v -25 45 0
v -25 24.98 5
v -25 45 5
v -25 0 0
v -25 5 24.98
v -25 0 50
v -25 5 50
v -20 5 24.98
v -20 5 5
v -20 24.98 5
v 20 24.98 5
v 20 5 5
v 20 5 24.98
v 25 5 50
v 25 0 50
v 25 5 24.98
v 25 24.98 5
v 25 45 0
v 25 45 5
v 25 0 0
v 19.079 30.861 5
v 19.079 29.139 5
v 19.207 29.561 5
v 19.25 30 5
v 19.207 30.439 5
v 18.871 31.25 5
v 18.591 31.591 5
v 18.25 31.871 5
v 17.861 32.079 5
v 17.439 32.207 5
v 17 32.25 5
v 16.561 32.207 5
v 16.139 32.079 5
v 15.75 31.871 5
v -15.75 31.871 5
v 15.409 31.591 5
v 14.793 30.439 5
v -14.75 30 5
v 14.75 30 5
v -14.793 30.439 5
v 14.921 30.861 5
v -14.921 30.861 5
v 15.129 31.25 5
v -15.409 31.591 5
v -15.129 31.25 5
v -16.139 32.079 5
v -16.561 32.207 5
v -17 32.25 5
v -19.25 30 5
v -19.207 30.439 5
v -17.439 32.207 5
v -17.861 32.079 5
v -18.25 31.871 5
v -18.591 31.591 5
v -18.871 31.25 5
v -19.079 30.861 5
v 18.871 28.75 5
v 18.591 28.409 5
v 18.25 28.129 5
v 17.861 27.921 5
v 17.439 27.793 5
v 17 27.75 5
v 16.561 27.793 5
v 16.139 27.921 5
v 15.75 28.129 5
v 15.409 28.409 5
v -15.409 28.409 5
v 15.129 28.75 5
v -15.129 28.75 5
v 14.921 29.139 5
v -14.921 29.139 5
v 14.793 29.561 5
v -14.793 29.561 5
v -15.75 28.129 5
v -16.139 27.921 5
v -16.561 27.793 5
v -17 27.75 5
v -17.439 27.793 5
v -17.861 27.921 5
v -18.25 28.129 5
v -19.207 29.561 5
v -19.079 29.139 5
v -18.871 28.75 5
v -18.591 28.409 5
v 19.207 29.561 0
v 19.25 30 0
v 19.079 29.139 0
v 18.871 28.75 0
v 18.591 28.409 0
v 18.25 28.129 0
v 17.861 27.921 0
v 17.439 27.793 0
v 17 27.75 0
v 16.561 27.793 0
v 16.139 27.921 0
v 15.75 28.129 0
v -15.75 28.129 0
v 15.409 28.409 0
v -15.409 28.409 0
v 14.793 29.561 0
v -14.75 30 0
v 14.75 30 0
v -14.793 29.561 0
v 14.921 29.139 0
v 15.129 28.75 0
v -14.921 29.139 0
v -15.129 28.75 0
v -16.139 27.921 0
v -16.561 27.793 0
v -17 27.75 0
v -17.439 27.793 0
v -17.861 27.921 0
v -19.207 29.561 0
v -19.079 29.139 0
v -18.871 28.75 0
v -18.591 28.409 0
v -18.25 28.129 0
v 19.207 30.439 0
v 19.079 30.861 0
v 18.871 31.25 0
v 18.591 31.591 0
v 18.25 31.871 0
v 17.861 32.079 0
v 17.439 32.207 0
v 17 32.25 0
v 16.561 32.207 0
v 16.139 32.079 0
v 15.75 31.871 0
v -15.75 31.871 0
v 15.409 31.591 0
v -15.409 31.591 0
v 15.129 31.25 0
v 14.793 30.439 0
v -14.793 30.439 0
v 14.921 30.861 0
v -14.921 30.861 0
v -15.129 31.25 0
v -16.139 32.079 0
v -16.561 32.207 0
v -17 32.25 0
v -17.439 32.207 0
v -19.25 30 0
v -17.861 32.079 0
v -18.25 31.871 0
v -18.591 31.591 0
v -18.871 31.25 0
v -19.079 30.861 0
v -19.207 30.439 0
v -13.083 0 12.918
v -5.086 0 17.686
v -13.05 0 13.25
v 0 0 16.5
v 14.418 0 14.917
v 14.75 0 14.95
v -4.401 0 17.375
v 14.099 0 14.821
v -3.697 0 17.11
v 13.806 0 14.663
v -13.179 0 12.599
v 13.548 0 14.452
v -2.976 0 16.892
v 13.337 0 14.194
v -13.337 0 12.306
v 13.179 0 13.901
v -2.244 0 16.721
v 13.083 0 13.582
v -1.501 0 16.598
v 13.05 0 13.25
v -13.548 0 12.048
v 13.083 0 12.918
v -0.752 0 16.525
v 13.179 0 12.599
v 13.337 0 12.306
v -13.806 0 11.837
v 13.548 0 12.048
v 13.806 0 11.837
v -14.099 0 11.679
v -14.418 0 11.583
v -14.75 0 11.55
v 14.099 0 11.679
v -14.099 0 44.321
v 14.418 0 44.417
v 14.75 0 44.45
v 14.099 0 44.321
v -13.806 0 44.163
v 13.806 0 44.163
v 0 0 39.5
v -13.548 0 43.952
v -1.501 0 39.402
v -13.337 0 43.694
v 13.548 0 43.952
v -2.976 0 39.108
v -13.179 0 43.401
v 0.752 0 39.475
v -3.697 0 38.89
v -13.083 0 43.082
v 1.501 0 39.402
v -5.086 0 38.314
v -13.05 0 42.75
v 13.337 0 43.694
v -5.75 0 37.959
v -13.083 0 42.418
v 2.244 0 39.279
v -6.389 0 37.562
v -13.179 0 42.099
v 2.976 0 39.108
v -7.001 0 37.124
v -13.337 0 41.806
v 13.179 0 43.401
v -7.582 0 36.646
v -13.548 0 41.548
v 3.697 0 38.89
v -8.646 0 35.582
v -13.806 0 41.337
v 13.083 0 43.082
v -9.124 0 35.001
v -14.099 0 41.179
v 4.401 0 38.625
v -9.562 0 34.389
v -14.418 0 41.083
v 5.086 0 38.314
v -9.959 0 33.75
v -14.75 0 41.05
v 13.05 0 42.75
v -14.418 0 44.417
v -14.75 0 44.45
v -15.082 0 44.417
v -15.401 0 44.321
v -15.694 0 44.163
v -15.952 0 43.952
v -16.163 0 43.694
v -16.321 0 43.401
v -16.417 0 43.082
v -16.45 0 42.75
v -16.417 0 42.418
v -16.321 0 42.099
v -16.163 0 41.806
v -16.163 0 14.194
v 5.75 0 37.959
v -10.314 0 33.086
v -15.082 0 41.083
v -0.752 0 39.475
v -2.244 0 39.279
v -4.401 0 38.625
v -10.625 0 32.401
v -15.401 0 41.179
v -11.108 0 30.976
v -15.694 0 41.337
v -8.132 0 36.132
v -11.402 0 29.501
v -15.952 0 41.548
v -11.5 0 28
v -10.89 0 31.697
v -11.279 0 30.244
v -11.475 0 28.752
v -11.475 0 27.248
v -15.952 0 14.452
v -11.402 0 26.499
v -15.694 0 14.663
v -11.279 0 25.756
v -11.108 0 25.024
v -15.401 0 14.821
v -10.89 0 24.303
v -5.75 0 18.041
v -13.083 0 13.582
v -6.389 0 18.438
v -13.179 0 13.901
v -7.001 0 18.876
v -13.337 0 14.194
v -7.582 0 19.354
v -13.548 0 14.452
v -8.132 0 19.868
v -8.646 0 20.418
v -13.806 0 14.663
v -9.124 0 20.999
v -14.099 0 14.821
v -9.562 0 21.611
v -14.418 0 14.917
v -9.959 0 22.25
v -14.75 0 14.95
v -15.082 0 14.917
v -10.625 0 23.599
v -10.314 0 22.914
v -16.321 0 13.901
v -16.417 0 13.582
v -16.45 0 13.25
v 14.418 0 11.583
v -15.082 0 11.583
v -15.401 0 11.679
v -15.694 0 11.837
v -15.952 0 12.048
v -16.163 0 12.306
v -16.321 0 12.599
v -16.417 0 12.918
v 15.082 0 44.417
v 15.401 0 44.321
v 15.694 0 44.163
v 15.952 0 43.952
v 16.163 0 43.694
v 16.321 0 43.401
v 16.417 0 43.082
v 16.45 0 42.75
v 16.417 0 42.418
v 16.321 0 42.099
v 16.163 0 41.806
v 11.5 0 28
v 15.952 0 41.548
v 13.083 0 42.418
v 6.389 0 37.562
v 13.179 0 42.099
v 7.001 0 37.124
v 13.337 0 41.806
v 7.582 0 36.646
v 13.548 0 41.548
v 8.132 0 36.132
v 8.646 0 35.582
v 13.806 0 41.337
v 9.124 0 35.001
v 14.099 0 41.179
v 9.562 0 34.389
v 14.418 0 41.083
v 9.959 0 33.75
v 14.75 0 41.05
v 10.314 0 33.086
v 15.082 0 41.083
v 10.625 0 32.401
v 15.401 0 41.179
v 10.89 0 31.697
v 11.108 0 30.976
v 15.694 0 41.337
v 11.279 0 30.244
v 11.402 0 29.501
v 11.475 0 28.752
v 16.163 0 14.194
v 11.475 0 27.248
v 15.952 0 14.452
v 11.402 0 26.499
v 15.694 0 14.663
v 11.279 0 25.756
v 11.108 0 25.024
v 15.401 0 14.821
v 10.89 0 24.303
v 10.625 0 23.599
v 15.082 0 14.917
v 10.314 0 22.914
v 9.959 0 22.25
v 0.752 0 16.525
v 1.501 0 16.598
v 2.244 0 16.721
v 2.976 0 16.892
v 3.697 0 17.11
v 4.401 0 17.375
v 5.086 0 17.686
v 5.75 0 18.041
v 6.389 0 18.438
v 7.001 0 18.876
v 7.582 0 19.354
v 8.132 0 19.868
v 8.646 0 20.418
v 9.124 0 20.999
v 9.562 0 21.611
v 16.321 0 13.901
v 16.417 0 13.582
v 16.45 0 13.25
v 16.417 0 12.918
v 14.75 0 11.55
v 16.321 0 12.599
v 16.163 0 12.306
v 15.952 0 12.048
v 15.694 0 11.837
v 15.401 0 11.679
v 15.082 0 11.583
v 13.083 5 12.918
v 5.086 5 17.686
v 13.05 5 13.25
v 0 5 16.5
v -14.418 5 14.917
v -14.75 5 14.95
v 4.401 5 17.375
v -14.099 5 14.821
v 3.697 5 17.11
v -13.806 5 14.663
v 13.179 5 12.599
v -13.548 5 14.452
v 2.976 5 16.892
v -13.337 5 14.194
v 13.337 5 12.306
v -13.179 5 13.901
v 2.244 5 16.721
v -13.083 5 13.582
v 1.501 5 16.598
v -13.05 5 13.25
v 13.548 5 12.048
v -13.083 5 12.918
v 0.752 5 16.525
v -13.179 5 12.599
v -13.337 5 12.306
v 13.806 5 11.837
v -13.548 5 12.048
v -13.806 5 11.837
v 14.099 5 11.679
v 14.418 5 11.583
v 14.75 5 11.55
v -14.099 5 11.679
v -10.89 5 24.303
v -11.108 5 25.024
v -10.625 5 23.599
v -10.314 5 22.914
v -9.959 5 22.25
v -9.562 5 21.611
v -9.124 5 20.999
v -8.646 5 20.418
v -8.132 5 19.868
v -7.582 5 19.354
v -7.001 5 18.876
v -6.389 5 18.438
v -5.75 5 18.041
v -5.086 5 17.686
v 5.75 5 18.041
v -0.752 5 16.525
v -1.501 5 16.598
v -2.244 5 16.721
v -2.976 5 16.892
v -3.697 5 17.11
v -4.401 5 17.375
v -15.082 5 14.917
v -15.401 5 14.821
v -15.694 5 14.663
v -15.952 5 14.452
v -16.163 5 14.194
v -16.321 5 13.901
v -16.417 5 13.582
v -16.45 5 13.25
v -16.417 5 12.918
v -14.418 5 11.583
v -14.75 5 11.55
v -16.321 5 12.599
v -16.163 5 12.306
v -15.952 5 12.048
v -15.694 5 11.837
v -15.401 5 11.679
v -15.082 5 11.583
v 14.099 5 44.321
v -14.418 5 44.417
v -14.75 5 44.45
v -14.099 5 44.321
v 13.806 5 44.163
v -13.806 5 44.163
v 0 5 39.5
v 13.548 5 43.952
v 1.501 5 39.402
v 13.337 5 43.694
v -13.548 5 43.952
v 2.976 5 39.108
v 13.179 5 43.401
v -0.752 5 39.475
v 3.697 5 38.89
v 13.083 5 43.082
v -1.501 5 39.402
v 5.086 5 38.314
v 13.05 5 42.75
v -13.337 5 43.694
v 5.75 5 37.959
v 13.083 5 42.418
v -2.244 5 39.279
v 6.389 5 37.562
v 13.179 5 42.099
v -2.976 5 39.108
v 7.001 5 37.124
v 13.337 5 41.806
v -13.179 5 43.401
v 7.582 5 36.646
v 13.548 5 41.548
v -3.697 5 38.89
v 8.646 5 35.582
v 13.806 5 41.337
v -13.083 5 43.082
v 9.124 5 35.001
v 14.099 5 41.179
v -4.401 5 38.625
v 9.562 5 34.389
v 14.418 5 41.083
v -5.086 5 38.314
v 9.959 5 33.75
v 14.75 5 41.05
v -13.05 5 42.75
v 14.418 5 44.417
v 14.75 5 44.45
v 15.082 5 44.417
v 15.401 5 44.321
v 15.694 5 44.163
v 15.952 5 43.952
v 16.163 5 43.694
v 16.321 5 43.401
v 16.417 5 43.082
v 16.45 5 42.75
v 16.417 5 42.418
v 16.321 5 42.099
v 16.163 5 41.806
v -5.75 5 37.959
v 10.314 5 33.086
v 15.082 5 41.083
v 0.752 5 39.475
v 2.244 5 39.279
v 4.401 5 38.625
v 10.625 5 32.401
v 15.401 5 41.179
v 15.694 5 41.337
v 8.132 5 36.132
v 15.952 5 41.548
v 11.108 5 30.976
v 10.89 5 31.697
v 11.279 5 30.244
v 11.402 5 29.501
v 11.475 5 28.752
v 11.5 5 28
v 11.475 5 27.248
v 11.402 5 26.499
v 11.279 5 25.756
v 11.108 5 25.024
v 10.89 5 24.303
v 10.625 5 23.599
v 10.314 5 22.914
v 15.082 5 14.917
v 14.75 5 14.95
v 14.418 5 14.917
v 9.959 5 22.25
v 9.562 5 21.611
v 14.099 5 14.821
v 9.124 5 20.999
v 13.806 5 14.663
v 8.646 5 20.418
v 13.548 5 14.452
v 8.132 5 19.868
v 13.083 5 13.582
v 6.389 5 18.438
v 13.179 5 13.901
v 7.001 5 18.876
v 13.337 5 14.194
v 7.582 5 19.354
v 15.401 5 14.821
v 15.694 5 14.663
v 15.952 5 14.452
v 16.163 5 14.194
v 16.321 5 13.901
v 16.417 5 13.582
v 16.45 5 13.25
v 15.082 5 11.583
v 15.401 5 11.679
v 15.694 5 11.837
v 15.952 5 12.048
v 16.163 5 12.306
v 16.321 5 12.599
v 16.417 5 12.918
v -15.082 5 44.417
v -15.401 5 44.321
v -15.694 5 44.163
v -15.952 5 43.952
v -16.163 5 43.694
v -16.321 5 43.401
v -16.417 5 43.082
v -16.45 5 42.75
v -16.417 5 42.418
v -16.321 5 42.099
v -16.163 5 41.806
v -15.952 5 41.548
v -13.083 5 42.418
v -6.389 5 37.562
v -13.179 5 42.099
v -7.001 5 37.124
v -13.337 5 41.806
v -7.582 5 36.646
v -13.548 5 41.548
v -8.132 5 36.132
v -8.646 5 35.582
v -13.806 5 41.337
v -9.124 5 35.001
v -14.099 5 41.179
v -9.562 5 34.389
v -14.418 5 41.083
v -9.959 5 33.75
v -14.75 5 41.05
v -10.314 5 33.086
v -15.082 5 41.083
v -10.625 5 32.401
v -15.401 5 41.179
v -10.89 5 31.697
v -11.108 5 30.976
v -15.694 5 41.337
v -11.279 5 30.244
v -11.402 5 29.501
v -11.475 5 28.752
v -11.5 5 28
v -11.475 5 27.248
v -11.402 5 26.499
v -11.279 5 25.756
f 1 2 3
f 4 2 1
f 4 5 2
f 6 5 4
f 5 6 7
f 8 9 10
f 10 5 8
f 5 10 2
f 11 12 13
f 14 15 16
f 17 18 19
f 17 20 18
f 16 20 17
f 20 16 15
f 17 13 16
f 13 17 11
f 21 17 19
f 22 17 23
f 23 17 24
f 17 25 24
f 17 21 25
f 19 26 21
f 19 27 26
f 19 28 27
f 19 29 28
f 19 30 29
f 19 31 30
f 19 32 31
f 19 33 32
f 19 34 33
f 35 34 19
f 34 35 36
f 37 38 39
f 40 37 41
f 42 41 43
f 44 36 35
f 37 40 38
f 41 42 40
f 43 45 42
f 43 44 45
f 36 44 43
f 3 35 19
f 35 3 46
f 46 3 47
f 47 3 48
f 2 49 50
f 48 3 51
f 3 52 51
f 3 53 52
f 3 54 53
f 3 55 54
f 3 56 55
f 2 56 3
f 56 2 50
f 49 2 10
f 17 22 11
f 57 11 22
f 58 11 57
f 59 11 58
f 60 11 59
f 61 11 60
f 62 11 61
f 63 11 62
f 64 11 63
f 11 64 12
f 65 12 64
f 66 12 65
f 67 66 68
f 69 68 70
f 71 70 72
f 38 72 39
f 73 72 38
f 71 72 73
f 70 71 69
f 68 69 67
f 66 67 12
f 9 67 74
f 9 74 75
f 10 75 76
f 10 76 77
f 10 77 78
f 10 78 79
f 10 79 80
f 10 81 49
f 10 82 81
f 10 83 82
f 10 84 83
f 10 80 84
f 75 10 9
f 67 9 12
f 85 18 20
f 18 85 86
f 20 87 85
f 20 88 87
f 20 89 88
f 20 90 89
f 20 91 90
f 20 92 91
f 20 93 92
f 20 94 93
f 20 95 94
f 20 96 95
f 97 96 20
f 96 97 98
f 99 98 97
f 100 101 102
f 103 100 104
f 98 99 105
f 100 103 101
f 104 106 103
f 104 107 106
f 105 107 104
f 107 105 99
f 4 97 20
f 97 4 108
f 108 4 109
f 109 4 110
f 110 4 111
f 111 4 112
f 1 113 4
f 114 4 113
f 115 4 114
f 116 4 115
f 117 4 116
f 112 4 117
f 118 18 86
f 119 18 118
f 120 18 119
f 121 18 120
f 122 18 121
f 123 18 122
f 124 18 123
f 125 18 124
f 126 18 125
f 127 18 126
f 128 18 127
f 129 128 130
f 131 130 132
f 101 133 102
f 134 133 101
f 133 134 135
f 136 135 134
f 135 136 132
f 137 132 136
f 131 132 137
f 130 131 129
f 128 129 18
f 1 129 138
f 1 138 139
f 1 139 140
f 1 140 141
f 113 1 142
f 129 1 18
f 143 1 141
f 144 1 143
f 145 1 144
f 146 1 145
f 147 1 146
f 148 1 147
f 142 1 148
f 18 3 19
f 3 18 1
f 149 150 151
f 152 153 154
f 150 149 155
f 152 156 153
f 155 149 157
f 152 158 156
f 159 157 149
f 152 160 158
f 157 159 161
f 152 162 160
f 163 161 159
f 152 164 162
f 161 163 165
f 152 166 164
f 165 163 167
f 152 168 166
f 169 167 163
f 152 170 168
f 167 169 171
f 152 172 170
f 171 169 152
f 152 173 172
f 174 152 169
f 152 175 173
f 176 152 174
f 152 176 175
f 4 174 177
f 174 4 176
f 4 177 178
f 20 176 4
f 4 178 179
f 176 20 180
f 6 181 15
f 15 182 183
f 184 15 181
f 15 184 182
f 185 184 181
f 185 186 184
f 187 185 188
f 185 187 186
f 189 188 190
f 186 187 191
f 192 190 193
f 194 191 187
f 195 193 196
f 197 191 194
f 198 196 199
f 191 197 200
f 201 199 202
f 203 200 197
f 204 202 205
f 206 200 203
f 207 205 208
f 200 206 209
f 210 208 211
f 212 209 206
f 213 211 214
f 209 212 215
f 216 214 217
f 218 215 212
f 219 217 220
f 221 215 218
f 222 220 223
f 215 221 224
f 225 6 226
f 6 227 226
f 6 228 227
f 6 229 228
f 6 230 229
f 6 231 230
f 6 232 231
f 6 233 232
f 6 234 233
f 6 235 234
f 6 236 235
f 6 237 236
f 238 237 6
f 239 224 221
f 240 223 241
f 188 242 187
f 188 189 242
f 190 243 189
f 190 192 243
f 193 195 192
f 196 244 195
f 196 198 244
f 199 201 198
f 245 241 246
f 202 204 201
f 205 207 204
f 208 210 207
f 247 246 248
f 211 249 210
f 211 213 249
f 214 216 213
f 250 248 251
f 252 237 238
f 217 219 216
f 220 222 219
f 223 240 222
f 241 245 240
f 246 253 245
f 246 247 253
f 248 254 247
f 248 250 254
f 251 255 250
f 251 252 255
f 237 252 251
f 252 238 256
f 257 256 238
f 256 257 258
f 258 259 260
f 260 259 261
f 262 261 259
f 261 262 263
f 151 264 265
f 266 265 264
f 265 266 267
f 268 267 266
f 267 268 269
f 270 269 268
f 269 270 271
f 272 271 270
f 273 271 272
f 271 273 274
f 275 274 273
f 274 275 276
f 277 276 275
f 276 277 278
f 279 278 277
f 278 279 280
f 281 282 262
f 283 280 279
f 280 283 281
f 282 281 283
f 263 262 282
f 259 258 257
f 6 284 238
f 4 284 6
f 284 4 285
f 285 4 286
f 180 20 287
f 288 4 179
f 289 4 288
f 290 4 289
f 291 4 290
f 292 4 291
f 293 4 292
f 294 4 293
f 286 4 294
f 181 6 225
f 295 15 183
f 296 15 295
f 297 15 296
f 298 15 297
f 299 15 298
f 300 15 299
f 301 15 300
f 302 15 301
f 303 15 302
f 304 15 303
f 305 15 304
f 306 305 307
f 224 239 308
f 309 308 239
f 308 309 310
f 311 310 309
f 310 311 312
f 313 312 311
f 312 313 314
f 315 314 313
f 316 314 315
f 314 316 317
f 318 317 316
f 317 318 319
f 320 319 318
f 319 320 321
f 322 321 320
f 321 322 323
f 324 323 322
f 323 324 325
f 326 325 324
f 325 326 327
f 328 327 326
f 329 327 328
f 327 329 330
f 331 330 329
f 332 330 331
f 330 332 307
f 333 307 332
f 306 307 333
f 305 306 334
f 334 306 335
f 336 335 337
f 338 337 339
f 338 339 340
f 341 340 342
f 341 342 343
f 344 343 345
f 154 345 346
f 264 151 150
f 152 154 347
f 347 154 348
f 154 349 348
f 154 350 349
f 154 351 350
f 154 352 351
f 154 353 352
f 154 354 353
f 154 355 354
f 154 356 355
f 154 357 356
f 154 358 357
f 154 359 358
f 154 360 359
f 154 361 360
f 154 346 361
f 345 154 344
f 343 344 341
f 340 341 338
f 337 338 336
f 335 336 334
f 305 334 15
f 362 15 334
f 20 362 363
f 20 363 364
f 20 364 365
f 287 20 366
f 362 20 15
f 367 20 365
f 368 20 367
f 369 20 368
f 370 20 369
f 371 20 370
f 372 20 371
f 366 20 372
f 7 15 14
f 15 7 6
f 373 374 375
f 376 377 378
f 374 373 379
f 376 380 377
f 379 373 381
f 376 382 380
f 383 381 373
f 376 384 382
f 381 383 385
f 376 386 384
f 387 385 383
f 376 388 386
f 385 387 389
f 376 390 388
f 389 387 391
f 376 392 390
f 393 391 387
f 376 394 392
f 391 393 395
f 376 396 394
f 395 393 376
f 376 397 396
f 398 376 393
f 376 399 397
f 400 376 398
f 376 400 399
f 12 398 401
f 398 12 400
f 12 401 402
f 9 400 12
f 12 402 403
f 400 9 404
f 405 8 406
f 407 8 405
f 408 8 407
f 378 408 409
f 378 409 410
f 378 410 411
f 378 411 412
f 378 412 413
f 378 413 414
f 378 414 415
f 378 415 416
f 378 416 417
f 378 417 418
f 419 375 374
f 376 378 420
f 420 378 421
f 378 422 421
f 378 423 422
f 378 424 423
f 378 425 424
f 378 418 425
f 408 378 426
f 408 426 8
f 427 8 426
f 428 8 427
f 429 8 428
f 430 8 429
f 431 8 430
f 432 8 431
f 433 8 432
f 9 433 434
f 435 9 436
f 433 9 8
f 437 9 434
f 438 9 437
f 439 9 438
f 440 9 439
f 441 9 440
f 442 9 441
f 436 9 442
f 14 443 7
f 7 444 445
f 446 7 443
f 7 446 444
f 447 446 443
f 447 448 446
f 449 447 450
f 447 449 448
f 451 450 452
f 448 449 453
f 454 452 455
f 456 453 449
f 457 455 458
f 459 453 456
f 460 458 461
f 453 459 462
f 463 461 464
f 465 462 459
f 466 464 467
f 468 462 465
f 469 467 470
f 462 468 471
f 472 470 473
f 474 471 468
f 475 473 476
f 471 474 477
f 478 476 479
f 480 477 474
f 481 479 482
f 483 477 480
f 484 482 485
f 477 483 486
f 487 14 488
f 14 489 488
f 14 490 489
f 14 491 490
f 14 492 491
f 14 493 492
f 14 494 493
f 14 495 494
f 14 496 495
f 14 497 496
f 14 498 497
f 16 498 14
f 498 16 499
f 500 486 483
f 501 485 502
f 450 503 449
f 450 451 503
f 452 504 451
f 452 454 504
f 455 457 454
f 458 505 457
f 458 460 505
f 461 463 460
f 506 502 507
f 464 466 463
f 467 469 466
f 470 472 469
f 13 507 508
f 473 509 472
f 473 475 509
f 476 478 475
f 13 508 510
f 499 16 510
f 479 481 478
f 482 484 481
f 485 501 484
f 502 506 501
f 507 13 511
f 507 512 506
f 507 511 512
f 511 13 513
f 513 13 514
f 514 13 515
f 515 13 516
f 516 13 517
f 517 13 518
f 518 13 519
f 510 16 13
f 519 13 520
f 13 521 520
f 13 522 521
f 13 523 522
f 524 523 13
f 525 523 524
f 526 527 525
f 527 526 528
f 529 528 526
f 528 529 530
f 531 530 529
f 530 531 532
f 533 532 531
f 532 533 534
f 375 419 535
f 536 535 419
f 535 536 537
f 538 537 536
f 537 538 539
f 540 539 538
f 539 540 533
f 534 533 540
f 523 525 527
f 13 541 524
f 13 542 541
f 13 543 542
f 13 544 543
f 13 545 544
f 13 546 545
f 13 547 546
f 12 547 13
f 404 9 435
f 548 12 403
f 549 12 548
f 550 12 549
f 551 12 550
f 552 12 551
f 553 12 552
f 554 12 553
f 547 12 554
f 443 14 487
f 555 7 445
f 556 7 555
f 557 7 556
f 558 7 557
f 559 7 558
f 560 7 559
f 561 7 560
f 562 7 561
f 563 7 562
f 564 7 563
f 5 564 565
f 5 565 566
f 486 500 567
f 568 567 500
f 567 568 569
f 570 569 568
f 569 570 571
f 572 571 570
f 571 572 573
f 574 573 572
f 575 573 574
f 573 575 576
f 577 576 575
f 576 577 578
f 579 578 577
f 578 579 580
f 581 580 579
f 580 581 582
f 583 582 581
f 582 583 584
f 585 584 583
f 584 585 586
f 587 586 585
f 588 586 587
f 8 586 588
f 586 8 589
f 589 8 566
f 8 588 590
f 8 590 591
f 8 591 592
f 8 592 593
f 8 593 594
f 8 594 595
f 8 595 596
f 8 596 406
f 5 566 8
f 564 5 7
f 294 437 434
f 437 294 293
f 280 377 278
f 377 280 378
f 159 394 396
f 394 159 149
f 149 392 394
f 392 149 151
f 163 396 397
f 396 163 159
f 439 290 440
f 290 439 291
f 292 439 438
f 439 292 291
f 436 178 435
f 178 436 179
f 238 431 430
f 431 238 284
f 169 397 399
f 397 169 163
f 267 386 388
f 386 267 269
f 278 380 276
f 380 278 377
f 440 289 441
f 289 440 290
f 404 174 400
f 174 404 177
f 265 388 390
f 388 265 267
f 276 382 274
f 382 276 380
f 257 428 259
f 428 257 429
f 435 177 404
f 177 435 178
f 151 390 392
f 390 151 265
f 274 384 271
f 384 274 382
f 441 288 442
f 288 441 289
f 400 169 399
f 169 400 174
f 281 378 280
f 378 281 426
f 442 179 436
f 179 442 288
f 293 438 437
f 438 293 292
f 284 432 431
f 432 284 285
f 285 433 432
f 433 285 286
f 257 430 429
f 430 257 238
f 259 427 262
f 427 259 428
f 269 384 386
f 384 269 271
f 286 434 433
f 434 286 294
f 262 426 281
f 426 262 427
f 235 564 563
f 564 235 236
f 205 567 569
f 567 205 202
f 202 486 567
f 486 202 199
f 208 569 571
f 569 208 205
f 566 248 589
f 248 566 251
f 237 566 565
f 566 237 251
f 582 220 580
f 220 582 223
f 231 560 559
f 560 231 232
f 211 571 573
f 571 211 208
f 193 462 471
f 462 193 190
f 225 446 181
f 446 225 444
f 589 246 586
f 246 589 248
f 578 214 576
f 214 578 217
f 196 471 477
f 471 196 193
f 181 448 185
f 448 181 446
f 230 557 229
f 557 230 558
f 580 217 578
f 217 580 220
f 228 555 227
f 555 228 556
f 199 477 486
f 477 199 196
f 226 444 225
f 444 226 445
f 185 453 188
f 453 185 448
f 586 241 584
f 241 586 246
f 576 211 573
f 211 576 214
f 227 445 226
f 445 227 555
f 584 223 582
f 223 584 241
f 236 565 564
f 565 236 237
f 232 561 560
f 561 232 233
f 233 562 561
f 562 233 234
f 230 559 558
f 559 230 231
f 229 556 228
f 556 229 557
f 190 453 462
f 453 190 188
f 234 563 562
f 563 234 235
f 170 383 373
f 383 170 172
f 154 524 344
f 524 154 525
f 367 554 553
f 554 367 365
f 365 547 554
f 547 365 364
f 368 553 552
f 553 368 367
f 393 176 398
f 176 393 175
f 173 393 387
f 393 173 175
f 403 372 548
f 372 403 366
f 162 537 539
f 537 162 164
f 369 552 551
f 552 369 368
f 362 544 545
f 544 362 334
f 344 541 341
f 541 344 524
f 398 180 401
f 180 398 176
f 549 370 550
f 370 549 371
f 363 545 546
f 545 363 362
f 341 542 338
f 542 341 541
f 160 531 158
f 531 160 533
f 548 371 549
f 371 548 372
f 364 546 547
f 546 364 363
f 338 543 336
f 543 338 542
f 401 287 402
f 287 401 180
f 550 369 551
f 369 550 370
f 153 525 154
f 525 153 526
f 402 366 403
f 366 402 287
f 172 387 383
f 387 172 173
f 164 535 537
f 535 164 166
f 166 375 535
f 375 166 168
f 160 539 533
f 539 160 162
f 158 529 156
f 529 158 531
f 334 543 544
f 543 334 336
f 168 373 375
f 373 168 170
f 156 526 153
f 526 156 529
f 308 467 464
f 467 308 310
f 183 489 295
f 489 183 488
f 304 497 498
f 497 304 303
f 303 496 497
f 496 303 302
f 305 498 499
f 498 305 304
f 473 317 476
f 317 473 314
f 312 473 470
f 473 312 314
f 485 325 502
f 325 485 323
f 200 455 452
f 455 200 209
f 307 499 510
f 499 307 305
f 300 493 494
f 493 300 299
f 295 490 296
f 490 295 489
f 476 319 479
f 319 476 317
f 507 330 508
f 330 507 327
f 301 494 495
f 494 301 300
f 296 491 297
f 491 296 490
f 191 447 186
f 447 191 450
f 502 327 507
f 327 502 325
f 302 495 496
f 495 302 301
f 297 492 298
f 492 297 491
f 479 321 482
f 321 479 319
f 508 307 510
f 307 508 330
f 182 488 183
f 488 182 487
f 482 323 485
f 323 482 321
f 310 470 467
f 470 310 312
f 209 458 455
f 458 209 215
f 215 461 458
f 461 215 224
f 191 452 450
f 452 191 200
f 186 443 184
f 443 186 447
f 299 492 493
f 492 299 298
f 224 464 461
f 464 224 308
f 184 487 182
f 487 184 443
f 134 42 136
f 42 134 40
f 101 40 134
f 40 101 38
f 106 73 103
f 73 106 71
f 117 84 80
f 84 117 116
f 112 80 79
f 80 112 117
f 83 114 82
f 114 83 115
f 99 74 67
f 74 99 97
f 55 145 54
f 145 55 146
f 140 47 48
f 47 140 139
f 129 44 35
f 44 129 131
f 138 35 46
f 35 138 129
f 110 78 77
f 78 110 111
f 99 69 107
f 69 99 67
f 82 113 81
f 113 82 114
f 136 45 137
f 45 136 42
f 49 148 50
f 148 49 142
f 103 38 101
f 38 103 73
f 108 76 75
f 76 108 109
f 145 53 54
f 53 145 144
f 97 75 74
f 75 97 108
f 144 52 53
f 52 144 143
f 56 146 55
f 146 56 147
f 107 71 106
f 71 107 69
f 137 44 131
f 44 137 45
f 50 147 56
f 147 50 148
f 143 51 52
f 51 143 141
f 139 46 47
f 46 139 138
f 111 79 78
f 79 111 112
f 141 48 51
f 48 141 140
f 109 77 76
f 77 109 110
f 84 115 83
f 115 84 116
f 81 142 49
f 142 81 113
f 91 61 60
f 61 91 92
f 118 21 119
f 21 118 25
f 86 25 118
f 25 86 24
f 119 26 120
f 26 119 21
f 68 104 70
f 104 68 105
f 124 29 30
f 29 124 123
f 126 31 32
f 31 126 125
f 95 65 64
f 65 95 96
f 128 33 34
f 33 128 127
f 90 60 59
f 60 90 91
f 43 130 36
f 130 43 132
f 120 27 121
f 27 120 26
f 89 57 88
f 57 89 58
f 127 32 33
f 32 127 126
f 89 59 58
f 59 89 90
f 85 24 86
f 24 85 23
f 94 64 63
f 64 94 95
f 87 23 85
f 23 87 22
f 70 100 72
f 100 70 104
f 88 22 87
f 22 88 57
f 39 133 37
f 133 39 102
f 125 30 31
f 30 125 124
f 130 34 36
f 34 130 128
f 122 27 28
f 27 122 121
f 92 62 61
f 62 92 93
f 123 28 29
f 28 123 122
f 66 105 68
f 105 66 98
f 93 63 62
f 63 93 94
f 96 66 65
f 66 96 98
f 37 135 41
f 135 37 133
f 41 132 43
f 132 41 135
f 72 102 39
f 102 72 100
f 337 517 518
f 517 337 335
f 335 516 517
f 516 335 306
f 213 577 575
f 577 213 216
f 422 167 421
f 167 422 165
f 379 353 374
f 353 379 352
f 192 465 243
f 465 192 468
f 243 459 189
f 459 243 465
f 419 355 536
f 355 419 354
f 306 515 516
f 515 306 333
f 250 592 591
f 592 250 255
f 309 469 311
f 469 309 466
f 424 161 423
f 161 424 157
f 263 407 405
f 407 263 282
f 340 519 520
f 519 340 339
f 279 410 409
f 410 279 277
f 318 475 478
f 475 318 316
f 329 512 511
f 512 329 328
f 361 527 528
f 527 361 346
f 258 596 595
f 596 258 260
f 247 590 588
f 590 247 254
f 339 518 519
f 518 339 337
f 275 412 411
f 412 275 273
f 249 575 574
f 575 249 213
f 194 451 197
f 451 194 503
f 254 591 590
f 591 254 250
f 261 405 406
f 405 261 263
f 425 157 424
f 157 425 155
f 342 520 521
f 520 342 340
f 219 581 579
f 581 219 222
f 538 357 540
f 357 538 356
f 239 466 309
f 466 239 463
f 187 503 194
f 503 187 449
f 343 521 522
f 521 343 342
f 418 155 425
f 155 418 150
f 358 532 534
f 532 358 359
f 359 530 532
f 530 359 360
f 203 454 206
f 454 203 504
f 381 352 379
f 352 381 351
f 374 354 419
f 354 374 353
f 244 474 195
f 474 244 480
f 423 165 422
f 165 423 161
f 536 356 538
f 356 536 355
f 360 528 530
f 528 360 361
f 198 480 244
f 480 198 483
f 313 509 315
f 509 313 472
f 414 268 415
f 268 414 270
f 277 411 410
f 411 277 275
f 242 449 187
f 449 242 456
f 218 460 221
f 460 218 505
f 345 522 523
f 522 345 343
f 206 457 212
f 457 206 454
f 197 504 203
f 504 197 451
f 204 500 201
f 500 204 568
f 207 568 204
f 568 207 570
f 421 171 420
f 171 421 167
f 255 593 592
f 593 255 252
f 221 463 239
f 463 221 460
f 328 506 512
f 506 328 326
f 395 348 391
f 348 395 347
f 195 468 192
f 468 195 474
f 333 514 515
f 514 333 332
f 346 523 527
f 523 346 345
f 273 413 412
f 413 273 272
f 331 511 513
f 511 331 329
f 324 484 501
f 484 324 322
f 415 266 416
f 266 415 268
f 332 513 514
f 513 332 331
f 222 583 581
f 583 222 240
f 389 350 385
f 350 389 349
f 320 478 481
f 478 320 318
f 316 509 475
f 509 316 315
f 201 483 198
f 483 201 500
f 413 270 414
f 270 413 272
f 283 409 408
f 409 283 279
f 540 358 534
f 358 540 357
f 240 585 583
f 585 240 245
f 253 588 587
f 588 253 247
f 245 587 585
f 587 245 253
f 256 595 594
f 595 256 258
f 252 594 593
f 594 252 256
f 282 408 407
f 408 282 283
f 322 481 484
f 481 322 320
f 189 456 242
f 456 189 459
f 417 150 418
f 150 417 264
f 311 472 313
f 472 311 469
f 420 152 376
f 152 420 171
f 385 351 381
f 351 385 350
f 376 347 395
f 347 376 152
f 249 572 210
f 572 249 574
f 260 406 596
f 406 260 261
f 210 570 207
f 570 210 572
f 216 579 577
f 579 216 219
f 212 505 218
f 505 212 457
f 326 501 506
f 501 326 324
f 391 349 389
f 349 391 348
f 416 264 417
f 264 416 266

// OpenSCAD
// L-bracket for a NEMA 17 stepper motor (syringe pumps, peristaltic pumps, shakers)
// Category: full hardware. Base plate with two M4 holes, vertical motor plate with
// the 22 mm boss hole + 31 mm M3 pattern, two gussets. Motor body mounts on the
// back (-Y) side, shaft pointing over the base.
// Print: PETG, base on the bed, 0.2 mm layers, 5 perimeters, 30 % infill.
// SPDX-License-Identifier: CERN-OHL-P-2.0

/* [Bracket] */
base = [50, 45, 5];      // X, Y, Z: spans y = 0..45
plate = [50, 5, 50];     // vertical plate at y = 0..5
boss_d = 23;             // NEMA 17 centring boss is 22 mm
boss_z = 28;             // motor axis height
screw_d = 3.4;           // M3 clearance
screw_spacing = 29.5;      // NEMA 17 bolt pattern
mount_d = 4.5;           // M4 clearance
mount_pos = [[-17, 30], [17, 30]];
gusset_t = 5;
gusset_len = 20;

/* [Hidden] */
eps = 0.01;

difference() {
    union() {
        translate([-base.x / 2, 0, 0]) cube(base);
        translate([-plate.x / 2, 0, 0]) cube(plate);
        for (sx = [-1, 1])
            translate([sx * (base.x / 2 - gusset_t / 2) - gusset_t / 2, plate.y - eps, base.z - eps])
                rotate([90, 0, 90]) linear_extrude(gusset_t)
                    polygon([[0, 0], [gusset_len, 0], [0, gusset_len]]);
    }
    translate([0, -1, boss_z]) rotate([-90, 0, 0]) cylinder(d = boss_d, h = plate.y + 2, $fn = 96);
    for (sx = [-1, 1], sz = [-1, 1])
        translate([sx * screw_spacing / 2, -1, boss_z + sz * screw_spacing / 2])
            rotate([-90, 0, 0]) cylinder(d = screw_d, h = plate.y + 2, $fn = 32);
    for (p = mount_pos)
        translate([p.x, p.y, -1]) cylinder(d = mount_d, h = base.z + 2, $fn = 32);
}
